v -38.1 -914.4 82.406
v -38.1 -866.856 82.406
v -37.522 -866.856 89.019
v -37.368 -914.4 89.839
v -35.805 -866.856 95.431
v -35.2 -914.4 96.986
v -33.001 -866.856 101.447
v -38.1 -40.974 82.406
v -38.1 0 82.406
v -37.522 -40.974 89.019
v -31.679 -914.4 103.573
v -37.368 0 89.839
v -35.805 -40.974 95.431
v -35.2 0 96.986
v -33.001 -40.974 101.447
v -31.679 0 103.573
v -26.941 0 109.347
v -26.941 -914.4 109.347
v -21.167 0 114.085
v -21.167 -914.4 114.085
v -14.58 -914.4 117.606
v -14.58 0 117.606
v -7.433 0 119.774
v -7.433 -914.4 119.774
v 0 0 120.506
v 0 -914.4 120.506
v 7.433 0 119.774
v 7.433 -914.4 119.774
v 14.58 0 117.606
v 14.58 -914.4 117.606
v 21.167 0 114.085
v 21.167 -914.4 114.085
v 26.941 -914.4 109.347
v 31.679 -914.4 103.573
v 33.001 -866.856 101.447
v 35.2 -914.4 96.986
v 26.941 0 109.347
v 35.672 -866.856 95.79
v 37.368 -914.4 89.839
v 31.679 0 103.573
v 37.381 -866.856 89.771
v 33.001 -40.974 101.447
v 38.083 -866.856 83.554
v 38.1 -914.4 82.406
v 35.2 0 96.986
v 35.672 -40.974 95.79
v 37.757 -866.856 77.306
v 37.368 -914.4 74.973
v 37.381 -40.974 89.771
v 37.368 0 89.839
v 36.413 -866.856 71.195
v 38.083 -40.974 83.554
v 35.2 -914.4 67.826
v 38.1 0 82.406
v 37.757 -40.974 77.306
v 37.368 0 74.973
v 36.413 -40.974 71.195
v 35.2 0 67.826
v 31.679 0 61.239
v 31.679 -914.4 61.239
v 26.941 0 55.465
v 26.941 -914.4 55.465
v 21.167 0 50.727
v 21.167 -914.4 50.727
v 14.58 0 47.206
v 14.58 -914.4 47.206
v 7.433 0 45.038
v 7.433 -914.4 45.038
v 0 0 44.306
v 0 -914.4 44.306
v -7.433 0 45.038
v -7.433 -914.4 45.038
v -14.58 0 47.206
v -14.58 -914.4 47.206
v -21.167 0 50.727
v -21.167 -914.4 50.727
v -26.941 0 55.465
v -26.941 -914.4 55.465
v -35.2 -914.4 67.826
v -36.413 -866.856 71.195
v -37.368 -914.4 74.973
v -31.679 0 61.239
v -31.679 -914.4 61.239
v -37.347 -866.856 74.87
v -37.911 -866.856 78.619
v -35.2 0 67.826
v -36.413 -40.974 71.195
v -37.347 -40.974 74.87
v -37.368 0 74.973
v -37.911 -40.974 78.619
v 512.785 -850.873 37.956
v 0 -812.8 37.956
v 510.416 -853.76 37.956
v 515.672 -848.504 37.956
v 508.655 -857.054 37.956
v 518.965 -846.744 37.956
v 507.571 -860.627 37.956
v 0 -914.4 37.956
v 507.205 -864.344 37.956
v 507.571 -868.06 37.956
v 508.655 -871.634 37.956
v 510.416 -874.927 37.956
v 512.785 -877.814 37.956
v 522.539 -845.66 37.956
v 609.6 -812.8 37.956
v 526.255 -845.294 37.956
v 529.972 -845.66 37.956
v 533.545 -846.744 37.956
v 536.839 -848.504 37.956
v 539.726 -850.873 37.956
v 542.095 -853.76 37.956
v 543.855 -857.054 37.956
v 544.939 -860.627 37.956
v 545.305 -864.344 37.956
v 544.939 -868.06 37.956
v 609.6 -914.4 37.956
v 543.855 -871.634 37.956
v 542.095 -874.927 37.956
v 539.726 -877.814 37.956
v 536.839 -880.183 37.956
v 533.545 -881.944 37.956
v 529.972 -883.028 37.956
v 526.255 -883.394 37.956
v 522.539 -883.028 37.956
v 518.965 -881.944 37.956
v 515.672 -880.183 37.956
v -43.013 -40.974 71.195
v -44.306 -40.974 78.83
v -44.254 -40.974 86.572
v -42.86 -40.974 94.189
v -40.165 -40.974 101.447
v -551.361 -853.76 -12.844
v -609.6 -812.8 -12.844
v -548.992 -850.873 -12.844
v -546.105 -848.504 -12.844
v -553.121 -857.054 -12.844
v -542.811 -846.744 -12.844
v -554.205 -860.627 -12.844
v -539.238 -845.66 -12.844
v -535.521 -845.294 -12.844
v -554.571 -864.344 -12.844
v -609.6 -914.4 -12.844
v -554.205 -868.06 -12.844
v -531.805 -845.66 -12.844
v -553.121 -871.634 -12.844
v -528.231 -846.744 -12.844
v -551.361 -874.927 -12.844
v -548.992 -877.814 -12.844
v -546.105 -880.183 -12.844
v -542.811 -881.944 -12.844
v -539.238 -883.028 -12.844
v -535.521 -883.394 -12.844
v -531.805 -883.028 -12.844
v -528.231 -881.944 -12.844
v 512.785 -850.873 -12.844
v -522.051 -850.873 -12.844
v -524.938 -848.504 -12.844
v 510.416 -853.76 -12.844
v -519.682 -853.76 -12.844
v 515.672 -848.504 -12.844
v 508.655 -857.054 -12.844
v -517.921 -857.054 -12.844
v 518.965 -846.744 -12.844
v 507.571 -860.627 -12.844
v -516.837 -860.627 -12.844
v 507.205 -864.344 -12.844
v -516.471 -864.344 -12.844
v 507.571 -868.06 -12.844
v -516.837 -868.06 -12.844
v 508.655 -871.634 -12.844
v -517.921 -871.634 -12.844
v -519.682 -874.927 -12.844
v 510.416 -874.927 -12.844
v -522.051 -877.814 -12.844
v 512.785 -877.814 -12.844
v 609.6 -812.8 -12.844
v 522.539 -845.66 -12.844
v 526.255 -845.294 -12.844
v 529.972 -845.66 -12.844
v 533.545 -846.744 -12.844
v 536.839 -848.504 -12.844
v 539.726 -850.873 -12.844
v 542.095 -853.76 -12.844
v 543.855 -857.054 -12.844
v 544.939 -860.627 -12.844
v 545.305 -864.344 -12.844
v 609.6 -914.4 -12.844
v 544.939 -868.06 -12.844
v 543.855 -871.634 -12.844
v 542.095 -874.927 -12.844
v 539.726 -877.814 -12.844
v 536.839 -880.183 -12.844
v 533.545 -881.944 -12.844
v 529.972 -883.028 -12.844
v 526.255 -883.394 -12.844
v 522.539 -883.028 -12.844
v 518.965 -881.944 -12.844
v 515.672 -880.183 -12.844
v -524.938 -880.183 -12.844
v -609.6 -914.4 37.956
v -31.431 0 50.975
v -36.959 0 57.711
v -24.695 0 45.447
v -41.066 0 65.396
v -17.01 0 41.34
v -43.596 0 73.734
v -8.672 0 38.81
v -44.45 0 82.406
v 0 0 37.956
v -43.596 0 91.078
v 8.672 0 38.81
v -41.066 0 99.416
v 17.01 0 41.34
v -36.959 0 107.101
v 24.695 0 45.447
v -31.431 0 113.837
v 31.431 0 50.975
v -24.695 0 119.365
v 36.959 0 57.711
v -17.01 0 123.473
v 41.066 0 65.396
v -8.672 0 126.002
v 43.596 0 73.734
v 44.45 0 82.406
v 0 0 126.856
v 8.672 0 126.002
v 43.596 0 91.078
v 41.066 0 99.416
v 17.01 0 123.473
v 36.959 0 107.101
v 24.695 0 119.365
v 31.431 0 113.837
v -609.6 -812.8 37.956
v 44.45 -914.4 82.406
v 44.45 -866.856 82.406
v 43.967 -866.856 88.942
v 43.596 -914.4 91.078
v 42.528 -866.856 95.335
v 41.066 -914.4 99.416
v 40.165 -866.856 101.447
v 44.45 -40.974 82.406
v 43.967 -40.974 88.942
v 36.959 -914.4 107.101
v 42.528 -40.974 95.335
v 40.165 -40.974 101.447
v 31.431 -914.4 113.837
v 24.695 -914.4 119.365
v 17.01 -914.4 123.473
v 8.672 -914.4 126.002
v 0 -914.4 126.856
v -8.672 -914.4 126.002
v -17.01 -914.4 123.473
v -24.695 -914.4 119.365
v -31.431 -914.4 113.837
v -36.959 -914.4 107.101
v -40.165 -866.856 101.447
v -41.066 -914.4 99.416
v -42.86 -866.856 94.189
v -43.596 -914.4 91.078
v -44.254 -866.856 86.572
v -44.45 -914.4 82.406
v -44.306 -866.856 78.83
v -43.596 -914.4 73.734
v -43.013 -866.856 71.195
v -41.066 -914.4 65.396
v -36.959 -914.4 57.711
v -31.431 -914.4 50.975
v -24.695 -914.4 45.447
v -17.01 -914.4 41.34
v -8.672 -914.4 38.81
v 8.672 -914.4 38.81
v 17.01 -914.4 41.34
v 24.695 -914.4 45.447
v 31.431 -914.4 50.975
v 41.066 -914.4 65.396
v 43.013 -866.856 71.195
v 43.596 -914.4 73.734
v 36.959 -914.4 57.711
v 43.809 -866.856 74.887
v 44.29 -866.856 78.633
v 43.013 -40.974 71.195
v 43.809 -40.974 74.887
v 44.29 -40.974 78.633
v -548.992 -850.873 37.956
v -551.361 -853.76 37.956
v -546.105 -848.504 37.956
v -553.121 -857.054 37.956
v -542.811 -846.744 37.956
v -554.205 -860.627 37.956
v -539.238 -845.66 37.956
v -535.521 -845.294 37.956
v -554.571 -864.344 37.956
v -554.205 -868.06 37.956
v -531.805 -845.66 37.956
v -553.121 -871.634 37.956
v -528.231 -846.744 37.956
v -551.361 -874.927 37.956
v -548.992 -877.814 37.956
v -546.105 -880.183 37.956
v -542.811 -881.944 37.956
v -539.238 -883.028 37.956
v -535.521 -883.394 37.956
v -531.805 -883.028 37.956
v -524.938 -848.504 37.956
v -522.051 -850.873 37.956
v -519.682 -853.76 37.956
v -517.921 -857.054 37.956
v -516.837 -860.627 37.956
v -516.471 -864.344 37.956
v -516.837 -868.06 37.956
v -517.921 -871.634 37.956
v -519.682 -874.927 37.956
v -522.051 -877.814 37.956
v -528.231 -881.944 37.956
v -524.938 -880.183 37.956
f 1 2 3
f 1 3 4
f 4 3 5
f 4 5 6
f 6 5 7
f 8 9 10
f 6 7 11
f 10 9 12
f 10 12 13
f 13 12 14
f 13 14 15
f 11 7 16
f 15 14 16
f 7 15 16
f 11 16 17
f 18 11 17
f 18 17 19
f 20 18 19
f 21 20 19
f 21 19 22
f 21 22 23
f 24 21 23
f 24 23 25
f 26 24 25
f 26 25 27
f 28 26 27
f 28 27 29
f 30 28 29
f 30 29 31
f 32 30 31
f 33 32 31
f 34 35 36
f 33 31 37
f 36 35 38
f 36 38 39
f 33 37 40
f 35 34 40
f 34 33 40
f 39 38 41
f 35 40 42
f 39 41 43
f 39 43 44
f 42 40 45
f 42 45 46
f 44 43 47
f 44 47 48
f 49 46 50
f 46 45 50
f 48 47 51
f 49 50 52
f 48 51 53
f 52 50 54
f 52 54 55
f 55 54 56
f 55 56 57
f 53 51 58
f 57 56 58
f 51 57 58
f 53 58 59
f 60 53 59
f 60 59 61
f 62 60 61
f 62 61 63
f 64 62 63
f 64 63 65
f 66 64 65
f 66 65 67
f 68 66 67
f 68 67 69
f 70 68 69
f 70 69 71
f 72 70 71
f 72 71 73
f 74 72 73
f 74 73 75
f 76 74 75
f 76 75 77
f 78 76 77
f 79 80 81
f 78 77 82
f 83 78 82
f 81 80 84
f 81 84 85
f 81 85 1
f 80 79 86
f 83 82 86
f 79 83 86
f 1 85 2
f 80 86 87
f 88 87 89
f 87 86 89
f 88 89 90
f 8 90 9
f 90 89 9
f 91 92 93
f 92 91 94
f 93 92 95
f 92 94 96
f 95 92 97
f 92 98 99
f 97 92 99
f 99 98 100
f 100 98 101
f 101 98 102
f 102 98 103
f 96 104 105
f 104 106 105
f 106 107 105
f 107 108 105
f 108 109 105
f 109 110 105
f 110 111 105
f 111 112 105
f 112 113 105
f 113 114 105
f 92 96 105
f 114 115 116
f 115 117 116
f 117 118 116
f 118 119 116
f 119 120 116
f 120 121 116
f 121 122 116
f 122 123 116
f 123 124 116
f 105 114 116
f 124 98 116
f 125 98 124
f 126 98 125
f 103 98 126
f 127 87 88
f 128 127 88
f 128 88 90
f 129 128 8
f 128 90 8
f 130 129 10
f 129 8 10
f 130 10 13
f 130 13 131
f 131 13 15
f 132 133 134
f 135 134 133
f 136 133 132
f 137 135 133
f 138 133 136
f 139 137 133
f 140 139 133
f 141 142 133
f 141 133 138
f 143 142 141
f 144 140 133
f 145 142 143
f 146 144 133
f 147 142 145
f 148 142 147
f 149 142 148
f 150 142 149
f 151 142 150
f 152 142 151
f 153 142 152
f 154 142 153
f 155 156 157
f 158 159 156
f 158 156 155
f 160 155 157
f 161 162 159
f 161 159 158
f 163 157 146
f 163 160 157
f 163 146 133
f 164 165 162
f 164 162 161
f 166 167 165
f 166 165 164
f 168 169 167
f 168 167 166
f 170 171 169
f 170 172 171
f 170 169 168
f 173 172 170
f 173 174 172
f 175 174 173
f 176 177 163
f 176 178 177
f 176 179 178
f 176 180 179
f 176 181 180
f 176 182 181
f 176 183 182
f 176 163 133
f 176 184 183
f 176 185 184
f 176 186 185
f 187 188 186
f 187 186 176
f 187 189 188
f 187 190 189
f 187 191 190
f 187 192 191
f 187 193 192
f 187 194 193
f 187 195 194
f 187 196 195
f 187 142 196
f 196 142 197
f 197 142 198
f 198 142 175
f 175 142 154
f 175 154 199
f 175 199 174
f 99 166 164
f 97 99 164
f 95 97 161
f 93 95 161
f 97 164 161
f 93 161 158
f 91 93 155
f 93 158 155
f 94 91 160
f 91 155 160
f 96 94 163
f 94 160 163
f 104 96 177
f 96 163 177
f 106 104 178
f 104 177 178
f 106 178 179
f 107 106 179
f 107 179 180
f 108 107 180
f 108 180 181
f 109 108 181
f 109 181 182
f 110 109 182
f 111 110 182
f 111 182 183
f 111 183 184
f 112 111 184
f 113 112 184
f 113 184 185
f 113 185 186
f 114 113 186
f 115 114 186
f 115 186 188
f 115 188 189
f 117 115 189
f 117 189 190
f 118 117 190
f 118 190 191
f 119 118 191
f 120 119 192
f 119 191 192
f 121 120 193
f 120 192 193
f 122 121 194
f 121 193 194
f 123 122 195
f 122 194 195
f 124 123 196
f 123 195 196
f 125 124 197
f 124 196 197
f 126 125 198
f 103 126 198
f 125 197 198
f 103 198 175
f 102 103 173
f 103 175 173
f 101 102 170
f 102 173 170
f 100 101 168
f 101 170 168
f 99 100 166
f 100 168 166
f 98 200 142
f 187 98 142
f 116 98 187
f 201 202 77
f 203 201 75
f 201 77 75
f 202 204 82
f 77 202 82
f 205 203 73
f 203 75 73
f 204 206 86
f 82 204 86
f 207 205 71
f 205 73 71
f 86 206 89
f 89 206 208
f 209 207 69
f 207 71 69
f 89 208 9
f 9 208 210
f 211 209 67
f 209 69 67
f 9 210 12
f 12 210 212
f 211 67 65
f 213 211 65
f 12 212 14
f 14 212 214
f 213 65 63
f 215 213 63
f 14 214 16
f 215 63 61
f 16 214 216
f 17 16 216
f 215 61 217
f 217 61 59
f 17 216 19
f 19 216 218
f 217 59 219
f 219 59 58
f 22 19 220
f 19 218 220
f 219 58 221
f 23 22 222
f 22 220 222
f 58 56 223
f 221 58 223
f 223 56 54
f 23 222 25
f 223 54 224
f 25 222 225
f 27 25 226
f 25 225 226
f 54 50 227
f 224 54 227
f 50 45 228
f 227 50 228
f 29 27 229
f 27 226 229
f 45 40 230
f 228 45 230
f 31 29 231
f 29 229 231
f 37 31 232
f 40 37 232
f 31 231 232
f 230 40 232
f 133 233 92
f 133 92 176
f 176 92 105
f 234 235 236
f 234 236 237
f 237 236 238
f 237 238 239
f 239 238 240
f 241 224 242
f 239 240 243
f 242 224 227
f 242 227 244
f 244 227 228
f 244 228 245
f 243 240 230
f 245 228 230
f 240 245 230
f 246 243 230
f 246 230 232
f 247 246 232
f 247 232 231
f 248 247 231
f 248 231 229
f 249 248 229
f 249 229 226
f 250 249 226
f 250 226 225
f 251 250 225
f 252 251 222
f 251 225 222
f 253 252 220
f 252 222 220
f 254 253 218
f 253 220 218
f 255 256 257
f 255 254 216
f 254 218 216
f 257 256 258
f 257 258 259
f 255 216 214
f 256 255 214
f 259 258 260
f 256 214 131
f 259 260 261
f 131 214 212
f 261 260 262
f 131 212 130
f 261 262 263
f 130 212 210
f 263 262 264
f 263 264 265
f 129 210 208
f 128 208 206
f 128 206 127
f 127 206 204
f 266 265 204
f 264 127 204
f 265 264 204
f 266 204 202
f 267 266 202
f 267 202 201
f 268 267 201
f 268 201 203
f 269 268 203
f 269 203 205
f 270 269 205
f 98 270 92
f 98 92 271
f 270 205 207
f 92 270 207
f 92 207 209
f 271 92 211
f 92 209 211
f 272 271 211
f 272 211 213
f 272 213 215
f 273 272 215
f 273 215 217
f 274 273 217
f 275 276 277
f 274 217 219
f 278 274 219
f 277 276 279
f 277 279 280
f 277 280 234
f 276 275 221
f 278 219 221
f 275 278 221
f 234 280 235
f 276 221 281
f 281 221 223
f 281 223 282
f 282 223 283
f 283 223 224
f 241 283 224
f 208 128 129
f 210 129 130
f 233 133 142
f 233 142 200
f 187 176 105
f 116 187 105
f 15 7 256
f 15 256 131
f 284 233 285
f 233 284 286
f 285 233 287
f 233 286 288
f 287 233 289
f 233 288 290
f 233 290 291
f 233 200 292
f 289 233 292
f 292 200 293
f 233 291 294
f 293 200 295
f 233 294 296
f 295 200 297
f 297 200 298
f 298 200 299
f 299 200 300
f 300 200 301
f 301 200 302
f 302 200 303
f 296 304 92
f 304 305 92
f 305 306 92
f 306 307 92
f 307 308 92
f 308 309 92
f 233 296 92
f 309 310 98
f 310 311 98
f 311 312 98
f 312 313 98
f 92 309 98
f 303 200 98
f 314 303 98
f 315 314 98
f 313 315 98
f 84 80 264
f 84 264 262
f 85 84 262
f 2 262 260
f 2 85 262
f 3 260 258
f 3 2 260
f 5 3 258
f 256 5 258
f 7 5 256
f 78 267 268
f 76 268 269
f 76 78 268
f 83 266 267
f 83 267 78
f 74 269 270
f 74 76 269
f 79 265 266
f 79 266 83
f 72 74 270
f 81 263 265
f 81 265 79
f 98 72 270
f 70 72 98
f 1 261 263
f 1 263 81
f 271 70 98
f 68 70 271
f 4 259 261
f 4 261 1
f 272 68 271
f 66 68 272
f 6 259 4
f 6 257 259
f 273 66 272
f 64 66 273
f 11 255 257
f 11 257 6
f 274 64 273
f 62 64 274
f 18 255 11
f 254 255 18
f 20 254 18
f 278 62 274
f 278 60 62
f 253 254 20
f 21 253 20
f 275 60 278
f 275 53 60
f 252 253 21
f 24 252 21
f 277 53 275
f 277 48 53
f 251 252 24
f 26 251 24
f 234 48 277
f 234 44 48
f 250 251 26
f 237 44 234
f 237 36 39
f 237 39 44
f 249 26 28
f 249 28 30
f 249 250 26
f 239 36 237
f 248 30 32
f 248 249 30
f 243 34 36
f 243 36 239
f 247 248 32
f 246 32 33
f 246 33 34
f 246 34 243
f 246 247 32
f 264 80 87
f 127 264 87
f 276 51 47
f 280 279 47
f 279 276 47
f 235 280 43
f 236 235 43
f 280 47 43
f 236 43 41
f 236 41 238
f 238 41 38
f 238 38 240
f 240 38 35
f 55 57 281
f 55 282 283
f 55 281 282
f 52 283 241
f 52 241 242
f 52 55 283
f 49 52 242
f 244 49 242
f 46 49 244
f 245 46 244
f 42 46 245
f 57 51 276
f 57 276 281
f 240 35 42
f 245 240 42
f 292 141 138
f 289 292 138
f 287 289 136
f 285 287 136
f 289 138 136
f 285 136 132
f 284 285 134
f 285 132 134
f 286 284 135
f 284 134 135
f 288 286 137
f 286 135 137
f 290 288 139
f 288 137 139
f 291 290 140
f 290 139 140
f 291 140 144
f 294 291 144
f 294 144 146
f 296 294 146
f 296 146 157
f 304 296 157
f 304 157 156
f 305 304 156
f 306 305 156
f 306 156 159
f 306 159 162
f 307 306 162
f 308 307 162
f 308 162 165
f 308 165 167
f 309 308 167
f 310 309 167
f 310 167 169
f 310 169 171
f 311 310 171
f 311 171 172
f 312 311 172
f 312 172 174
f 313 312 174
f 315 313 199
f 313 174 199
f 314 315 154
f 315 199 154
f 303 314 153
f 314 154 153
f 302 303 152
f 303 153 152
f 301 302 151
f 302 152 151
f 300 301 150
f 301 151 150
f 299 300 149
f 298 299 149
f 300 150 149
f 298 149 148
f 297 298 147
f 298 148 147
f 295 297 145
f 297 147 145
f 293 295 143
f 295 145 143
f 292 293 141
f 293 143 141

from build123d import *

# Parameters (mm, degrees)
F0_R      = 44.45
F1_DEPTH  = 914.4
F3_D      = 76.2
F4_W      = 1219.2
F4_H      = 50.8
F5_DEPTH  = 101.6
F7_D      = 38.1
F8_D      = 38.1
F9_W      = 825.881869
F9_H      = 30.252091
F10_DEPTH = 114.3
F11_DEPTH = 109.22


with BuildPart() as f1:
    # F0 (on Front) → F1 (new body)
    with BuildSketch(Plane.XZ):
        with Locations((0, 82.406055)):
            Circle(F0_R)
    extrude(amount=F1_DEPTH)

    # F3 (through all)
    with Locations(Plane.XZ.offset(914.4)):
        with Locations((0, 82.406055)):
            Hole(F3_D / 2)

    # F4 (on face) → F5 (join)
    with BuildSketch(Plane.XZ.offset(914.4)):
        with Locations((0, 12.556055)):
            Rectangle(F4_W, F4_H)
    extrude(amount=-F5_DEPTH)

    # F7 (through all)
    with Locations(Plane.XY.offset(37.956055)):
        with Locations((-535.521269, -864.343703)):
            Hole(F7_D / 2)

    # F8 (through all)
    with Locations(Plane.XY.offset(37.956055)):
        with Locations((526.25519, -864.343703)):
            Hole(F8_D / 2)

    # F9 (on Right) → F10 (cut)
    with BuildSketch(Plane.YZ):
        with Locations((-453.915223, 86.321439)):
            Rectangle(F9_W, F9_H)
    extrude(amount=-F10_DEPTH, mode=Mode.SUBTRACT)

    # F9 (on Right) → F11 (cut)
    with BuildSketch(Plane.YZ):
        with Locations((-453.915223, 86.321439)):
            Rectangle(F9_W, F9_H)
    extrude(amount=F11_DEPTH, mode=Mode.SUBTRACT)


solid = f1.part
